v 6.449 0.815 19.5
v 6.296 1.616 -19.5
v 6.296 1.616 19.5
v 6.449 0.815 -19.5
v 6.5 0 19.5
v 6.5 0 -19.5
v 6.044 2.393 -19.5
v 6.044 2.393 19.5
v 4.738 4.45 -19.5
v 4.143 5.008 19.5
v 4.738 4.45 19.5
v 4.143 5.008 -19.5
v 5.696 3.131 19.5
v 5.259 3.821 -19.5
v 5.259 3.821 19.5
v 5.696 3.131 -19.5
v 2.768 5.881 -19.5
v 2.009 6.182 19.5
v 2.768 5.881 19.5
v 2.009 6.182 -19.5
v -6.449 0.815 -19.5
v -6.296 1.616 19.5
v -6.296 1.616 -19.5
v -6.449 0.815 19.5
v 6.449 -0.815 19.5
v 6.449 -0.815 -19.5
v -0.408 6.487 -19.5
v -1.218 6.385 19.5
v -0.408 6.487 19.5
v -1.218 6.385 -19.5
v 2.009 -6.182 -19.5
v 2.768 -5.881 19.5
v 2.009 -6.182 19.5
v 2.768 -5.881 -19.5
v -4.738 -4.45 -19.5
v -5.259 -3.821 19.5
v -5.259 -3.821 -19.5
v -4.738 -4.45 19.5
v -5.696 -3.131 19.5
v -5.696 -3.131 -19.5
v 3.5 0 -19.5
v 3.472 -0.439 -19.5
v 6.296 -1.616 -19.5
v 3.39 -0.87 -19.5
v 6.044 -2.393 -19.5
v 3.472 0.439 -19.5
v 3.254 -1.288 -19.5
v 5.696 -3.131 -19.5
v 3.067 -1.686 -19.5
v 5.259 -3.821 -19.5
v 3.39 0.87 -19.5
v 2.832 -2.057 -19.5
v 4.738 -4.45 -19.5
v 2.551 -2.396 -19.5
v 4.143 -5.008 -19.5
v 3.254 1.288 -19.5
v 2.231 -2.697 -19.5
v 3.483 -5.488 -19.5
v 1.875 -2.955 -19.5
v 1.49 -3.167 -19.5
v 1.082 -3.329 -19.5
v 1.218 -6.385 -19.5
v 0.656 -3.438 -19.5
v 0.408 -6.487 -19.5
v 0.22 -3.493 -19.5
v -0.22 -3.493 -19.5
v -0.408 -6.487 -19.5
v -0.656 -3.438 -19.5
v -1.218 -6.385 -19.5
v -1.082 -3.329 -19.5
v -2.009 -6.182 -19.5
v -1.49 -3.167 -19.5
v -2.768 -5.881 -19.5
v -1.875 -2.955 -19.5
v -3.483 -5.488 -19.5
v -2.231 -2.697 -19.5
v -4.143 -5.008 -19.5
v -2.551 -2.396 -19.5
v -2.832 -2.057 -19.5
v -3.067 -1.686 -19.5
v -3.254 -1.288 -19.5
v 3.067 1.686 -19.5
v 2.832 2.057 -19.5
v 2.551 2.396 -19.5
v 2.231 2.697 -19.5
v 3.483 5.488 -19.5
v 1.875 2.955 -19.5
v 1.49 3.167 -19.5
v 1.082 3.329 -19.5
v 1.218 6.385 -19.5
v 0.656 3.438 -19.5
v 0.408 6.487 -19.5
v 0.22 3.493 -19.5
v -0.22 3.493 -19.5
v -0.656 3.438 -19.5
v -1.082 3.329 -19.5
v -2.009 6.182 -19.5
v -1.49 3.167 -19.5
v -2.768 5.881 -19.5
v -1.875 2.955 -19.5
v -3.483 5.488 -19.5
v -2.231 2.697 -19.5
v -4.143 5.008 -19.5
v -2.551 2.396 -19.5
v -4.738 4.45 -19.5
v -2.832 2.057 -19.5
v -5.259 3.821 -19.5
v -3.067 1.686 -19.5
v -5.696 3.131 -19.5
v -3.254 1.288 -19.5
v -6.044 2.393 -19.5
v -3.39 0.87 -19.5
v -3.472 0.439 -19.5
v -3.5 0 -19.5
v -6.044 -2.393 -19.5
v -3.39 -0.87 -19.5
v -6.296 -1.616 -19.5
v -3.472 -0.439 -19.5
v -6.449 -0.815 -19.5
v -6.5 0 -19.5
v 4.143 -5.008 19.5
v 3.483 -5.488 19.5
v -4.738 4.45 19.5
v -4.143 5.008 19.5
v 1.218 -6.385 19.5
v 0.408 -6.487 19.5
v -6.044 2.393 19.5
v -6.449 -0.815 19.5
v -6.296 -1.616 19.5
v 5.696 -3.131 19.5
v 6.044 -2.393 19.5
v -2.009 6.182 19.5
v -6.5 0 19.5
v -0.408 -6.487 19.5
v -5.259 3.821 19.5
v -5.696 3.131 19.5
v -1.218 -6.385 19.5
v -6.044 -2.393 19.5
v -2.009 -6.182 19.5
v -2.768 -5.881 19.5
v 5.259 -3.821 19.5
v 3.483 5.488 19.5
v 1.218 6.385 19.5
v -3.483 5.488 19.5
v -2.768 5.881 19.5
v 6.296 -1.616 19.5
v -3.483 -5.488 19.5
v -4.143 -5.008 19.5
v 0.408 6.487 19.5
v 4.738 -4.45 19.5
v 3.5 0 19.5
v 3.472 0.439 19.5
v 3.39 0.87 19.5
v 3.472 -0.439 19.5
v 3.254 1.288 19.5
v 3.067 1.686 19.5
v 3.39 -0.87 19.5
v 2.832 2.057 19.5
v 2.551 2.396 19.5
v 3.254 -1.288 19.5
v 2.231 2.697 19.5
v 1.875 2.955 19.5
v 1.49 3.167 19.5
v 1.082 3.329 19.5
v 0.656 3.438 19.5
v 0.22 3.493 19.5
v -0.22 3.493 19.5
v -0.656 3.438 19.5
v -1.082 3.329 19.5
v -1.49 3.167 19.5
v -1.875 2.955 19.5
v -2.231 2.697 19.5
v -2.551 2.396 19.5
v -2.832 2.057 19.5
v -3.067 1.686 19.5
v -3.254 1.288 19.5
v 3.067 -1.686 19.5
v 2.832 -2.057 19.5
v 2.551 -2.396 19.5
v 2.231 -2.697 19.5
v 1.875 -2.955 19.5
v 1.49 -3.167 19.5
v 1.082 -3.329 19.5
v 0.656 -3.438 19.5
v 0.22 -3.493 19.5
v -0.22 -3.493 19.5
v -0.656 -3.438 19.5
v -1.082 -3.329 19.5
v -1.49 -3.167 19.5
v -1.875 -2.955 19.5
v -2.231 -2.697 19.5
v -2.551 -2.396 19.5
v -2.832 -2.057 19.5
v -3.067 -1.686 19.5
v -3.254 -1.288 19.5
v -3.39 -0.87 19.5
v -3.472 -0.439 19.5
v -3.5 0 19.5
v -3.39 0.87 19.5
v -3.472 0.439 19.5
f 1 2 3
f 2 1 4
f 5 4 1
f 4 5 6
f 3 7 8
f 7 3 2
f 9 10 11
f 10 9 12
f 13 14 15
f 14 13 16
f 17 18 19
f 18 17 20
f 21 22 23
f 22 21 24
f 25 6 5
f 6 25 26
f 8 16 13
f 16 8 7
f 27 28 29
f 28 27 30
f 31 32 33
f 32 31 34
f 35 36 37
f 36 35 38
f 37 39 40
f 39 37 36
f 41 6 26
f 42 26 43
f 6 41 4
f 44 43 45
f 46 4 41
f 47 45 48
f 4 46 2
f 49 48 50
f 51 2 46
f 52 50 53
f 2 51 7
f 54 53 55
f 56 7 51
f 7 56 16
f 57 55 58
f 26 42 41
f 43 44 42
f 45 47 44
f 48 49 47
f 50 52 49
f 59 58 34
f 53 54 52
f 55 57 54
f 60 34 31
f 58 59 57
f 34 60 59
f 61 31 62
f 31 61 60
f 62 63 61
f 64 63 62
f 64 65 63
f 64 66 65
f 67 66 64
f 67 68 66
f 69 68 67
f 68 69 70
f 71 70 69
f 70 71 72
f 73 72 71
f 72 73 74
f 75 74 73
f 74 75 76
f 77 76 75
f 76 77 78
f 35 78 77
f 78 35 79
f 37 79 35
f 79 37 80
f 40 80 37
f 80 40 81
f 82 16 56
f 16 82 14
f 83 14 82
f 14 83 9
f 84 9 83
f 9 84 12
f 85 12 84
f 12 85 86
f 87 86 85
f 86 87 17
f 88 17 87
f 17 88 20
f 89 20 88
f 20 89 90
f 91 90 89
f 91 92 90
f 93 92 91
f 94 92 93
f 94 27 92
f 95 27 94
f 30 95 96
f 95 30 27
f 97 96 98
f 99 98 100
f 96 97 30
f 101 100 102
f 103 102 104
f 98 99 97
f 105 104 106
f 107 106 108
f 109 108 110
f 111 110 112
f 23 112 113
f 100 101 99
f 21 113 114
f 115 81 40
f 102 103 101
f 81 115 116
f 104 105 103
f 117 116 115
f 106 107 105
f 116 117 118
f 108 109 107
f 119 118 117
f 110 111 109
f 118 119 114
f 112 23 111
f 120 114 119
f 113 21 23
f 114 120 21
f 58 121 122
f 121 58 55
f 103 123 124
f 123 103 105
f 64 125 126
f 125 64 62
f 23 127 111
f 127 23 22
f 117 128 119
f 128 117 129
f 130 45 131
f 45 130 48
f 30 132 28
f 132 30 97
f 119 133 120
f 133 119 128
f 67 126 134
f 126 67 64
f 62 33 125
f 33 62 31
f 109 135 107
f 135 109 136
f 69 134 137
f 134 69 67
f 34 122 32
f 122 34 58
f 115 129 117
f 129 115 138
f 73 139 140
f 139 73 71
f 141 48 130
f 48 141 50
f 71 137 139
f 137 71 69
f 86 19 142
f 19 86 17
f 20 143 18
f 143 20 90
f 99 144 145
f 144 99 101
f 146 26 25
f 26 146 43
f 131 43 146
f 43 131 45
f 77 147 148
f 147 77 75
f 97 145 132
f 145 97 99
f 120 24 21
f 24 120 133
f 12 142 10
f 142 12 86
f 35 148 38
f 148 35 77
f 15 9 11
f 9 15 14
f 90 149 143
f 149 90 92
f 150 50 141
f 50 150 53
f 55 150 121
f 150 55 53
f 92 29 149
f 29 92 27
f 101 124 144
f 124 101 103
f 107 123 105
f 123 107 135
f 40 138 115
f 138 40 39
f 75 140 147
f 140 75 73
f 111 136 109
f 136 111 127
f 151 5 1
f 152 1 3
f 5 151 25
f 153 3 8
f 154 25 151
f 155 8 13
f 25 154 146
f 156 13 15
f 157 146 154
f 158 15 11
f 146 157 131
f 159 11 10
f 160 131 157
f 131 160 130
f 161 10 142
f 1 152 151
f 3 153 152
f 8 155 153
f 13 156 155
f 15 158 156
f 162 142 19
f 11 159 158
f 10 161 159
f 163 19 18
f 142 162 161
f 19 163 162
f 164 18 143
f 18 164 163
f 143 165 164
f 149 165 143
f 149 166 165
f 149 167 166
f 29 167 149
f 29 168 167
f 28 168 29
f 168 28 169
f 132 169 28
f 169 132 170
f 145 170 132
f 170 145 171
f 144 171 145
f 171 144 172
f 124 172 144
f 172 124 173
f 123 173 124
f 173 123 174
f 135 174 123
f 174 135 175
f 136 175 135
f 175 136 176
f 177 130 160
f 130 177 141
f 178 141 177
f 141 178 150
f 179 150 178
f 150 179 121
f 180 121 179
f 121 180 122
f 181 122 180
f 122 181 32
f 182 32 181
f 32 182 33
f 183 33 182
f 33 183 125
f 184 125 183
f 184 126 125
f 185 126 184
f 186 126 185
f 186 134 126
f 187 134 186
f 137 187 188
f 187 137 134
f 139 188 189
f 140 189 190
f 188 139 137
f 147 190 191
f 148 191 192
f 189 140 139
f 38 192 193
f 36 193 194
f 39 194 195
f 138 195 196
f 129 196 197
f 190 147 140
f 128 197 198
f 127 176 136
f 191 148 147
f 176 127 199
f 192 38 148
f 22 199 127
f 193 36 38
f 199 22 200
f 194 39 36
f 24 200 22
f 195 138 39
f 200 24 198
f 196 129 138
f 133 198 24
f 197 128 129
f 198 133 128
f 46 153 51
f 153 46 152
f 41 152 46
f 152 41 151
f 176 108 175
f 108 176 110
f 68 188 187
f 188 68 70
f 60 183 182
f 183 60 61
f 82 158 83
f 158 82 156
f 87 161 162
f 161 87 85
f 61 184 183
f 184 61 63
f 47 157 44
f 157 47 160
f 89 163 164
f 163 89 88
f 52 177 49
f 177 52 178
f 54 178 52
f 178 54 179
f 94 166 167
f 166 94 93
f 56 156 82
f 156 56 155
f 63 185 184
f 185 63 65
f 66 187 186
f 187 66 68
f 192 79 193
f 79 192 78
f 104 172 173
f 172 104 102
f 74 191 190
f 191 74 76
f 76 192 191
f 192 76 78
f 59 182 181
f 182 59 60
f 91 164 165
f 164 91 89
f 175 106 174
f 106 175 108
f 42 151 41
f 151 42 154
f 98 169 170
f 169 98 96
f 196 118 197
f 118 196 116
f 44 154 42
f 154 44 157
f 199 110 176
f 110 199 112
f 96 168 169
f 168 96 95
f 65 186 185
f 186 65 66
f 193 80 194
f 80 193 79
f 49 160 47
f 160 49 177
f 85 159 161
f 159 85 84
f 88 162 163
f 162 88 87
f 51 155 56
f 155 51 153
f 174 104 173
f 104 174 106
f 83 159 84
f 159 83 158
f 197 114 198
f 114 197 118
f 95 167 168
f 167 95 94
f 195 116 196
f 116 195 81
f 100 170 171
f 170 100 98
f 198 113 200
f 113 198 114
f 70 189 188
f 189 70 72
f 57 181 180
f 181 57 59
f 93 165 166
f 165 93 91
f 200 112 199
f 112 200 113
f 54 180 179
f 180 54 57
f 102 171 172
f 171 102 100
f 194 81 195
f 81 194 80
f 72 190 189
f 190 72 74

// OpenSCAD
$fn = 50;


difference() {
	union() {
		translate(v = [0, 0, -19.5000000000]) {
			cylinder(h = 39, r = 6.5000000000);
		}
	}
	union() {
		translate(v = [0, 0, -100.0000000000]) {
			cylinder(h = 200, r = 3.5000000000);
		}
	}
}
